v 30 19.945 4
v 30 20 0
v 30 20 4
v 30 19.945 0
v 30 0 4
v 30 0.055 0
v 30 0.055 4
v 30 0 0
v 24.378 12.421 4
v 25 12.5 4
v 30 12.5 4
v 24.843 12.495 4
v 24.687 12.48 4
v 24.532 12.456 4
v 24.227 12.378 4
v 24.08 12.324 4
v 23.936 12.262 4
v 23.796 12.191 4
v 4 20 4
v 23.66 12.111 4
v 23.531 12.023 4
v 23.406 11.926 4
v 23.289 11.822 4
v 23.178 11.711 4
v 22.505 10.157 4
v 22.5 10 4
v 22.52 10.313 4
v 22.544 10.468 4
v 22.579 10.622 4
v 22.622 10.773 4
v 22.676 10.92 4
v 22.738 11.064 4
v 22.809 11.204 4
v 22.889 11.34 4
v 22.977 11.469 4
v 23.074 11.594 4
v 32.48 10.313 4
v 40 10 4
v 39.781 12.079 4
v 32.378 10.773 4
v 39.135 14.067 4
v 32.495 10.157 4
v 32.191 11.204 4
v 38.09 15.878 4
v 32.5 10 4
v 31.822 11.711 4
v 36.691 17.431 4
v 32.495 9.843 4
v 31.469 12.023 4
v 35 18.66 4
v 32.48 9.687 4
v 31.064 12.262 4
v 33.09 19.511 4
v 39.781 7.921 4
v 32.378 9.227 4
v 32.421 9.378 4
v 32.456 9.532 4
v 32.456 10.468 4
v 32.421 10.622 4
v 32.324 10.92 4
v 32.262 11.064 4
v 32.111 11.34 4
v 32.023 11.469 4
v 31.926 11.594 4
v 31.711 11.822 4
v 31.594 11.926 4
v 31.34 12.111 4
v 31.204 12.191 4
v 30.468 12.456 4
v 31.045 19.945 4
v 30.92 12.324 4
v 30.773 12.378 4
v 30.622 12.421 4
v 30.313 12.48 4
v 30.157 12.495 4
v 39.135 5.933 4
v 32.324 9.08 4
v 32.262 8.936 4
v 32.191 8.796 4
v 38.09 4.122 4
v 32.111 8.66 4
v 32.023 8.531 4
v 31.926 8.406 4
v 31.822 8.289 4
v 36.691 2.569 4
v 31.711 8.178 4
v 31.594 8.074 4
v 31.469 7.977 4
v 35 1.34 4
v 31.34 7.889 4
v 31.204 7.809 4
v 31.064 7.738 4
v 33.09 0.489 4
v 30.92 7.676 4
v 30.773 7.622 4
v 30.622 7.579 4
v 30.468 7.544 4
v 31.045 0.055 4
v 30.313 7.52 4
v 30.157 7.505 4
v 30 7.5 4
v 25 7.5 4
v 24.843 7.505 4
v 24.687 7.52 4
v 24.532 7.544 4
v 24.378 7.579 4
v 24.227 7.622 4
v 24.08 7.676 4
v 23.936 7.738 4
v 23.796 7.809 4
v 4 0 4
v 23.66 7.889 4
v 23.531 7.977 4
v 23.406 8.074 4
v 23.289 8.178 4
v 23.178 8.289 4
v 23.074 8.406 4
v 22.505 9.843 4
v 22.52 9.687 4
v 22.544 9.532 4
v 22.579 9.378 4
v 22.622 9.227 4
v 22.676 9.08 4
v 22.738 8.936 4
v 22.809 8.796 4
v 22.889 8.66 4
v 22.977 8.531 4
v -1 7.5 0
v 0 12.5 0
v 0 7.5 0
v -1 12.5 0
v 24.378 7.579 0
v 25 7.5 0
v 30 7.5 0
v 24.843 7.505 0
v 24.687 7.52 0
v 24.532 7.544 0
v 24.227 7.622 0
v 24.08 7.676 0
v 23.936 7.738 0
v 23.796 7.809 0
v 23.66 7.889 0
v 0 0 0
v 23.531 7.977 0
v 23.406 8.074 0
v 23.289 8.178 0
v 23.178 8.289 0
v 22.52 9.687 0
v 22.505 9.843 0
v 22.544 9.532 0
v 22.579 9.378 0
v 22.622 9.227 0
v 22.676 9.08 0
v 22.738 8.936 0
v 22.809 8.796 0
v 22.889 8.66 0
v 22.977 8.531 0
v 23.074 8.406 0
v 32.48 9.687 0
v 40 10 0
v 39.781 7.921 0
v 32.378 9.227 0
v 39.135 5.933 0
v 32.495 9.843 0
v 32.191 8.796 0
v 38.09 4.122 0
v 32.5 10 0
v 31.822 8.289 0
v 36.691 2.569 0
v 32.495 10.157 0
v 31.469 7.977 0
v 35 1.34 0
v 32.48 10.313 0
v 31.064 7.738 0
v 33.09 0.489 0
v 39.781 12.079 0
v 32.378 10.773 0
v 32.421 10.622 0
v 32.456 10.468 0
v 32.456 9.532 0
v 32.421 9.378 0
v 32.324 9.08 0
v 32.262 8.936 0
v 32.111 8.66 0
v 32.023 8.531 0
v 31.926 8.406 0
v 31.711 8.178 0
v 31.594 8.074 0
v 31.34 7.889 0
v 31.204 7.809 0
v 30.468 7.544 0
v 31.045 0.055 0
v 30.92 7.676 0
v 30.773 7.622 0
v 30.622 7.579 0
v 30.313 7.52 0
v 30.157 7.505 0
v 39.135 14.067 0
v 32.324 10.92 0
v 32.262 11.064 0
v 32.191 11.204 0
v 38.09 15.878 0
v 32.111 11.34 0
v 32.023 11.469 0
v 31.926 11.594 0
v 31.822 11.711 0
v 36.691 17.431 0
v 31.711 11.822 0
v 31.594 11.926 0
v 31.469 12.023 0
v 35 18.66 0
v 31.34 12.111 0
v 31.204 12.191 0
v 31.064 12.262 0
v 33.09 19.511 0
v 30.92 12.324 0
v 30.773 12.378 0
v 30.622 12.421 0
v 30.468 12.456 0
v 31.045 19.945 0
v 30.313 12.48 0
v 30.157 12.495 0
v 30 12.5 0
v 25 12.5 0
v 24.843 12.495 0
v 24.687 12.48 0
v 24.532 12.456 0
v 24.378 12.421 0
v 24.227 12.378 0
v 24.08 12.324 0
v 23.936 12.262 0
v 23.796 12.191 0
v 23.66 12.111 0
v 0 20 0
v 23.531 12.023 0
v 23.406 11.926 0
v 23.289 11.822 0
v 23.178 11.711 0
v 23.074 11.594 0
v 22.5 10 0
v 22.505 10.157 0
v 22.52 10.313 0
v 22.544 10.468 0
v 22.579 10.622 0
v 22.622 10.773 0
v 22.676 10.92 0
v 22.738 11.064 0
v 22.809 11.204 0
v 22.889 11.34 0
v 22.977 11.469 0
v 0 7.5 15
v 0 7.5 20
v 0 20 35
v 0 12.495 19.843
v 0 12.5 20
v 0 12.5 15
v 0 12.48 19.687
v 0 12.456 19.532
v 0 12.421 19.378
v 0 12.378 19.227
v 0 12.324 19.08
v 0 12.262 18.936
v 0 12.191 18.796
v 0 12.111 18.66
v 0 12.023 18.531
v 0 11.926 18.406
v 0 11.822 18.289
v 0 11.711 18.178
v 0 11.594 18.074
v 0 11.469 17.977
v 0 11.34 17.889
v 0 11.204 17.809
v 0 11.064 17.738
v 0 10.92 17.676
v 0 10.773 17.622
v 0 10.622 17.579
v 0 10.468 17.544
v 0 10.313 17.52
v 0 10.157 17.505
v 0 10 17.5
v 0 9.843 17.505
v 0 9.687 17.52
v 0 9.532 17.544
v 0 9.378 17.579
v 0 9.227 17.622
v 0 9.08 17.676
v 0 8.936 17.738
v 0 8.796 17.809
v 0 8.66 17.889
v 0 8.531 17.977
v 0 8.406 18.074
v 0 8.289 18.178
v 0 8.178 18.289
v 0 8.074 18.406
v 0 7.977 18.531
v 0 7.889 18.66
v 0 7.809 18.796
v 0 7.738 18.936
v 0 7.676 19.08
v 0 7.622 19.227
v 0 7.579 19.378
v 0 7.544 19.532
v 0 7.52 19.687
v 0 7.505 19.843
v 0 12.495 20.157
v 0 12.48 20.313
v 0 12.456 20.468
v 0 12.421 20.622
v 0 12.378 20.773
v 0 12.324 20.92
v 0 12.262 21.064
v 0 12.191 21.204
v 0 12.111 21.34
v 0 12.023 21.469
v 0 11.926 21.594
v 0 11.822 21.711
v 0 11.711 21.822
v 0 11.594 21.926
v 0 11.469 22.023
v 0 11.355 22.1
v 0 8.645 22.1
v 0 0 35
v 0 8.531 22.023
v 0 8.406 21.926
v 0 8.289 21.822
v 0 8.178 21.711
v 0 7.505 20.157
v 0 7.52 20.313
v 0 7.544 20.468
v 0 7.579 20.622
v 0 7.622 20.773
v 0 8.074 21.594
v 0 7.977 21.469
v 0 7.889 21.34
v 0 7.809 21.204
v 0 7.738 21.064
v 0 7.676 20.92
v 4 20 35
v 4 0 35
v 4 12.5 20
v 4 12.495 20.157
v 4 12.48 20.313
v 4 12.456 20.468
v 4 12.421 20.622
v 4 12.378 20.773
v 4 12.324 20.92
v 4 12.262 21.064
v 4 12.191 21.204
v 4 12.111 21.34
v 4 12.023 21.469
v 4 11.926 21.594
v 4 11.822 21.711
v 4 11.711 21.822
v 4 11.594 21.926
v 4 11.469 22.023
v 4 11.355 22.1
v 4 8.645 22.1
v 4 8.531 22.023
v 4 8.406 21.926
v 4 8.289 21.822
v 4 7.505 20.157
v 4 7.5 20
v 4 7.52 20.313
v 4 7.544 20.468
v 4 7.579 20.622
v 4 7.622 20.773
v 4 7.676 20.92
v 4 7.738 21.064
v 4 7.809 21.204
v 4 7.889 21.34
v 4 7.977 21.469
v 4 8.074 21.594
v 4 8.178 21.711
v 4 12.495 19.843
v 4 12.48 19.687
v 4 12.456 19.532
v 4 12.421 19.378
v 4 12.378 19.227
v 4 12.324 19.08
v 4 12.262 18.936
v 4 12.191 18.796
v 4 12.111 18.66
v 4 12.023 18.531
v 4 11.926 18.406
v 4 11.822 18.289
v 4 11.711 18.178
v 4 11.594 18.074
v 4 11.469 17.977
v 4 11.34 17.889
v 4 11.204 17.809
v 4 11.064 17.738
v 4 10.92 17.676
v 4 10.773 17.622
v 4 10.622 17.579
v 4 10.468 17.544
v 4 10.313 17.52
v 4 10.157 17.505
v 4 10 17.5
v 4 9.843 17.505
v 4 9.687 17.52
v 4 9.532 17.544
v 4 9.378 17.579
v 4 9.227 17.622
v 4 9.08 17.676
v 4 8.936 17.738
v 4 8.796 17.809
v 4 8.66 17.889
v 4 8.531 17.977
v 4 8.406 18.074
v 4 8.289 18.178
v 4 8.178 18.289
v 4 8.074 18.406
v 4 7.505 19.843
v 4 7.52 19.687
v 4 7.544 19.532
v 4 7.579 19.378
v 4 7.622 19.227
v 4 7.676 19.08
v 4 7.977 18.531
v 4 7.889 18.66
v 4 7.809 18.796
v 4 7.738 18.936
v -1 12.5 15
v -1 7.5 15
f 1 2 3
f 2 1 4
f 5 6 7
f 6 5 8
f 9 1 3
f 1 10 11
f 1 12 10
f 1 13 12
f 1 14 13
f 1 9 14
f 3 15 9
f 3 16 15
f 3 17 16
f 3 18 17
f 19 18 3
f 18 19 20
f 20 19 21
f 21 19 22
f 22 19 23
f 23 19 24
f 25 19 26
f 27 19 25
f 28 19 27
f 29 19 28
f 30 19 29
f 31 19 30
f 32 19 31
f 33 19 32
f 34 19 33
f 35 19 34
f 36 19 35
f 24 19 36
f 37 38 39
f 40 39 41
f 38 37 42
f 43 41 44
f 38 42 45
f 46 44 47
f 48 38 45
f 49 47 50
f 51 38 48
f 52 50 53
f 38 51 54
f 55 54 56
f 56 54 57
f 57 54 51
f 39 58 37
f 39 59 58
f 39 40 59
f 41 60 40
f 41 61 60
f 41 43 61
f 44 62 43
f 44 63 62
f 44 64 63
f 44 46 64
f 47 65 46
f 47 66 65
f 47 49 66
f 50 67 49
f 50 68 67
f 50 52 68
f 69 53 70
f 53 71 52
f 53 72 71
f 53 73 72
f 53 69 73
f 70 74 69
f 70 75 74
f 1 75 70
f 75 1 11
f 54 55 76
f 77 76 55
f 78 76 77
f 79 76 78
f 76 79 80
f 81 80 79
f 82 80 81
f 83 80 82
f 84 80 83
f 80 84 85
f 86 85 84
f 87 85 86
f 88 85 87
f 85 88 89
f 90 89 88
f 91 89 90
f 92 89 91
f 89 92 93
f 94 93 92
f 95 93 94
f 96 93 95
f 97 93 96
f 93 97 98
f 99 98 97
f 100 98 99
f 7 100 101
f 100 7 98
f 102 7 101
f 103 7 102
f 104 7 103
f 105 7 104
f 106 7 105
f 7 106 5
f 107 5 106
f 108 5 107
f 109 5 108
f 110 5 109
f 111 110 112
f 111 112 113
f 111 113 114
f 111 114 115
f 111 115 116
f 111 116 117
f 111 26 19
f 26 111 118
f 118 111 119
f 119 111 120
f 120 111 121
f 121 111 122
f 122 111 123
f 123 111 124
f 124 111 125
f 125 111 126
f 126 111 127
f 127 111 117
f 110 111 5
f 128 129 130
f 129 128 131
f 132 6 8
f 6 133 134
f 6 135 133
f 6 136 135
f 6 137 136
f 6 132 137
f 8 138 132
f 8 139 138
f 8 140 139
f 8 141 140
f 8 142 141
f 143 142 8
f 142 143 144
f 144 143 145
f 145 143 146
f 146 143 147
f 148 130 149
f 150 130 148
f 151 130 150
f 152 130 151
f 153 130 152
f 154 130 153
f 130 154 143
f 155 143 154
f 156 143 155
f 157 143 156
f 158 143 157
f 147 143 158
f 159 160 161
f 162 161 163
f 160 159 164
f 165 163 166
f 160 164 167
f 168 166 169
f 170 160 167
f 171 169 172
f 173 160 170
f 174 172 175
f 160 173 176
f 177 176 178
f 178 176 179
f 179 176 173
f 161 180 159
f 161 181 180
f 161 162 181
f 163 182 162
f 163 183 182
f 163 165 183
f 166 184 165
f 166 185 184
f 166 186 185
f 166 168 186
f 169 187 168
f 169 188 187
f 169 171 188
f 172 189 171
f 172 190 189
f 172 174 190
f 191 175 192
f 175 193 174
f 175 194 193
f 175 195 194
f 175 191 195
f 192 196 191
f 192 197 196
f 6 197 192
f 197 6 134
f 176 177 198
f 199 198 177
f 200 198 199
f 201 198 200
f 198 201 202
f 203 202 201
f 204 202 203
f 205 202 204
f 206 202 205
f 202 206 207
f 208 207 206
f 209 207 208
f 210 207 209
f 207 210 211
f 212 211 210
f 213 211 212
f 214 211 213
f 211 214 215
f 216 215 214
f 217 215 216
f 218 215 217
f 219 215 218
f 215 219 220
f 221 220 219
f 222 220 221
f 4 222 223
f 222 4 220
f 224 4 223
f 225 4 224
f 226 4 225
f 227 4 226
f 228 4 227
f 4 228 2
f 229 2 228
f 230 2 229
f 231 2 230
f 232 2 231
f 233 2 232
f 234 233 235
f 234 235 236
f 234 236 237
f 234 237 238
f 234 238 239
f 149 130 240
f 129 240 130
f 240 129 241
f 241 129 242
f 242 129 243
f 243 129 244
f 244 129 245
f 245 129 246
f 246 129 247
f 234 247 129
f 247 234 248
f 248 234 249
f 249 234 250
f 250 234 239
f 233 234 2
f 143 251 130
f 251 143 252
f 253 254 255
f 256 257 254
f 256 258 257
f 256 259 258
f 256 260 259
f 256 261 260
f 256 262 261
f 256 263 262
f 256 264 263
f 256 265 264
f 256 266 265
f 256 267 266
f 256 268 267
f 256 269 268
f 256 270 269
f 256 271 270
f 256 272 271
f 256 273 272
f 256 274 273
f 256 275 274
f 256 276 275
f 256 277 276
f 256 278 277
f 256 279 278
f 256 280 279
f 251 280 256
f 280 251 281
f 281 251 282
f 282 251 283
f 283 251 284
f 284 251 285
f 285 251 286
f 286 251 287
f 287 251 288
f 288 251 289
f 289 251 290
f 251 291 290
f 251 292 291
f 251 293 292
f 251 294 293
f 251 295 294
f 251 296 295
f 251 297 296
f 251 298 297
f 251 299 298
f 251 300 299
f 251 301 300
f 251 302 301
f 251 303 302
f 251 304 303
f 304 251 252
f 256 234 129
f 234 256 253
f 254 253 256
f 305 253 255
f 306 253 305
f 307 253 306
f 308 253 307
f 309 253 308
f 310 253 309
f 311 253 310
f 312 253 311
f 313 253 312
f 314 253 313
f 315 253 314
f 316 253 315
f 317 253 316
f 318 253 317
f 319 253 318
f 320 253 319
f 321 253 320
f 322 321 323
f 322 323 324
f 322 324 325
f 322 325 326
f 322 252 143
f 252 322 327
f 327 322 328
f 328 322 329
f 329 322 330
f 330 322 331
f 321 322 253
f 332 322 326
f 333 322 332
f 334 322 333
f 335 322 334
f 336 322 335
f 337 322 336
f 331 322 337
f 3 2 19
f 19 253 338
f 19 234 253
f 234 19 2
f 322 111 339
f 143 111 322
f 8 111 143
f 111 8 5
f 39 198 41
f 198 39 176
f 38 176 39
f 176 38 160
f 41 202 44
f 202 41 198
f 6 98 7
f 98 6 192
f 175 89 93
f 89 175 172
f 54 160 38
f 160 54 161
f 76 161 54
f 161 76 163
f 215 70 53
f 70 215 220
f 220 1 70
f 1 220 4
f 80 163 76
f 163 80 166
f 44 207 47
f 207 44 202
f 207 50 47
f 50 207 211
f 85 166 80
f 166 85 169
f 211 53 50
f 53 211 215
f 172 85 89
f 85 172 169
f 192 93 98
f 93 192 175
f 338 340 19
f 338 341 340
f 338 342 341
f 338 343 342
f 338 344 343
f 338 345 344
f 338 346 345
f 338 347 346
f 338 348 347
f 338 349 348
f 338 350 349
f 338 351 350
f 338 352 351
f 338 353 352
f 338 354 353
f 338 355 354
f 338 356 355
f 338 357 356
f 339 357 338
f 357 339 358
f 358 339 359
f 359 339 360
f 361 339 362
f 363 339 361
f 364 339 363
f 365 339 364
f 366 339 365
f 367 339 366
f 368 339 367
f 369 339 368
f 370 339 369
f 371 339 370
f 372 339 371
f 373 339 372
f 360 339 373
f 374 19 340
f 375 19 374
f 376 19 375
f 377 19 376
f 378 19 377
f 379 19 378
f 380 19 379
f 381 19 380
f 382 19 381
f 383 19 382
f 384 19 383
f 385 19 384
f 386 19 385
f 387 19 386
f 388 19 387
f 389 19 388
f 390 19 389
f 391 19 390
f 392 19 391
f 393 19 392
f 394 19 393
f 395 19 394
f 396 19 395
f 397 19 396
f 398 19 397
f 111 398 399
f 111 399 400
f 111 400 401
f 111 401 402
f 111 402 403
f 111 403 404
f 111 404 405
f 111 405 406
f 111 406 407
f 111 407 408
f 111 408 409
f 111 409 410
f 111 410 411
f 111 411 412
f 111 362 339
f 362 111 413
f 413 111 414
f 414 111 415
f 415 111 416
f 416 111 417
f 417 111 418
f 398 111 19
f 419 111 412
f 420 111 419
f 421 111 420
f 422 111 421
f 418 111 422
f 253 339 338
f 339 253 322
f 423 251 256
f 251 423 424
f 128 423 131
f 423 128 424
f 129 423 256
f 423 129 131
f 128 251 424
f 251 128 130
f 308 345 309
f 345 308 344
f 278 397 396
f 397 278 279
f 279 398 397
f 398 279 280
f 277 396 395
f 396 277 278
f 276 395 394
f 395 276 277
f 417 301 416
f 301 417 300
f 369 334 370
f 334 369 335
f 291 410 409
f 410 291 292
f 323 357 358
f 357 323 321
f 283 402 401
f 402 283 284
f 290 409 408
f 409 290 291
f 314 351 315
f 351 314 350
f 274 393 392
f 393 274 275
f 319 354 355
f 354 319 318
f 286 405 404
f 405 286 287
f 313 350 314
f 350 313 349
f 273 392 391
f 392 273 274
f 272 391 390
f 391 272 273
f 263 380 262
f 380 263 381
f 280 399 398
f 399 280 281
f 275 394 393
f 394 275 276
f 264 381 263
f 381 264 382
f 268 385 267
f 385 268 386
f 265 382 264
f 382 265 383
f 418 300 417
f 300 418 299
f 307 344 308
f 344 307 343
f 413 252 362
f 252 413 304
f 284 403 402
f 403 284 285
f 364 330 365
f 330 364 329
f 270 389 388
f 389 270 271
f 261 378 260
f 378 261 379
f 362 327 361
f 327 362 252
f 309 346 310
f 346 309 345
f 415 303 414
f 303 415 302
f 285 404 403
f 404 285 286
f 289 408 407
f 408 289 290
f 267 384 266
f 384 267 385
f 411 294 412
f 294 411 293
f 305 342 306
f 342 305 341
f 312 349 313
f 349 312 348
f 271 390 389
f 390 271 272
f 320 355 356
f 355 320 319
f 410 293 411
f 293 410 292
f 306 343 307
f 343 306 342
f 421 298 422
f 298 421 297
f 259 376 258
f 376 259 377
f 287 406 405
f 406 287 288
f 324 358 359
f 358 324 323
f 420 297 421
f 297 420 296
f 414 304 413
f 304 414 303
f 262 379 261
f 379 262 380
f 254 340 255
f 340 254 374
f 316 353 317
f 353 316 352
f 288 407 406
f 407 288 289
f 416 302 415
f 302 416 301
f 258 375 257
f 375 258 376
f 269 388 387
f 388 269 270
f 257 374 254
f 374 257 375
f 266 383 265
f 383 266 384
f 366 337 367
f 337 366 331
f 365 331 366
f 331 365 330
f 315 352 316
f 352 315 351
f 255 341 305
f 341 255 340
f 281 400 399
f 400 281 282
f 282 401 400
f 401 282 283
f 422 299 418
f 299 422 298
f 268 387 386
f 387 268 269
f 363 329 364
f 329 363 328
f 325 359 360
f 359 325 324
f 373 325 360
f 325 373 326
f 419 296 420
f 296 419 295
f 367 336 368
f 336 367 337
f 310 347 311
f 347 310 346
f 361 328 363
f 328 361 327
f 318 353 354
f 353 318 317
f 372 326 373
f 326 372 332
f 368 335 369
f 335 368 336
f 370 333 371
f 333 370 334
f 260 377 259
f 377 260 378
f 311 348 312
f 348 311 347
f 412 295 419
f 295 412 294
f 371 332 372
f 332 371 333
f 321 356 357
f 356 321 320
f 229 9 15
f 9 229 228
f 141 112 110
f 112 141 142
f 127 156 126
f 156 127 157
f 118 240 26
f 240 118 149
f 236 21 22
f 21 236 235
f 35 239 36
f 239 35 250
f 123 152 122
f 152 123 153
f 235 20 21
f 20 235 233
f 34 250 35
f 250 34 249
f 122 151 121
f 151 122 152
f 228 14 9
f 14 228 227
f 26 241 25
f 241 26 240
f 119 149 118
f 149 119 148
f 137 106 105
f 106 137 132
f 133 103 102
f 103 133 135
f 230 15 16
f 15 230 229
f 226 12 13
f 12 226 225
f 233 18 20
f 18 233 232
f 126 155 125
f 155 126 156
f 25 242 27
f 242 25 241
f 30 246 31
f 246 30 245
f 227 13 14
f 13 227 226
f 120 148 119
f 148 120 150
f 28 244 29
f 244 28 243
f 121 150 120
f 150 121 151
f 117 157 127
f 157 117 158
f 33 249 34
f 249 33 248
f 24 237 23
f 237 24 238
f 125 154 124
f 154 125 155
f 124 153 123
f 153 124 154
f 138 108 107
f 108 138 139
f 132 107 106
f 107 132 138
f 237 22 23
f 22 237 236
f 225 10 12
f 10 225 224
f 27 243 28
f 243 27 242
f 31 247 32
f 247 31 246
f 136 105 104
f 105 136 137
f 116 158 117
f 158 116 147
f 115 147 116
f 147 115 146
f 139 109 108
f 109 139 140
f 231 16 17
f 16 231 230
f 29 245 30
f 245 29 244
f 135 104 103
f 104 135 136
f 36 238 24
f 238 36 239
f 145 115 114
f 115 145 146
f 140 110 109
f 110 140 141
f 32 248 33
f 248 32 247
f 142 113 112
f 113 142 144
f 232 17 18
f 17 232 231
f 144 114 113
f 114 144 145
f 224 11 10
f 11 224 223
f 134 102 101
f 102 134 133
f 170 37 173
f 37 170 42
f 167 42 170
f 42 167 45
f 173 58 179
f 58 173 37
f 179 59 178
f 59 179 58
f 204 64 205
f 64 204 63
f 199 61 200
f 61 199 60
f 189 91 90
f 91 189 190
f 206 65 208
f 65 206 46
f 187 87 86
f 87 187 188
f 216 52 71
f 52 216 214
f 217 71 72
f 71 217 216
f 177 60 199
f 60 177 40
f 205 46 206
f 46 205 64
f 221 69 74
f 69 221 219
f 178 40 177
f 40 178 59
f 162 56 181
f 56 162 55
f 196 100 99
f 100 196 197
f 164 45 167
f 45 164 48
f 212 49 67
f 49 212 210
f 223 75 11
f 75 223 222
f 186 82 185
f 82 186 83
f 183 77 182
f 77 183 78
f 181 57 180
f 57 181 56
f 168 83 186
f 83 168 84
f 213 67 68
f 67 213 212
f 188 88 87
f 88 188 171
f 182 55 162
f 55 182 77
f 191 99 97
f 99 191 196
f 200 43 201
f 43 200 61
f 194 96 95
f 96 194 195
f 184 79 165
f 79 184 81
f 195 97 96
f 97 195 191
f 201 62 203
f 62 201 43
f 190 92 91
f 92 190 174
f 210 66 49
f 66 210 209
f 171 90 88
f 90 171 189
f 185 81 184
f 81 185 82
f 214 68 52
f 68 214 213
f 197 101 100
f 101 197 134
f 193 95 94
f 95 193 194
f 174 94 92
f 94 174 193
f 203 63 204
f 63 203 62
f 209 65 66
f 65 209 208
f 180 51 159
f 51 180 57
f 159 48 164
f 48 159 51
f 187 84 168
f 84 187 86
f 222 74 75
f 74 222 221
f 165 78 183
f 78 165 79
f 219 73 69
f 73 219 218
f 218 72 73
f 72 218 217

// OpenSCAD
// file: functions.scad
/**********************************
	File: functions.scad
	Revision: 0.1 (10/7/2012)
	OpenSCAD version by:
	Michael Williams (gannon)
	mswillia@mtu.edu
**********************************/
include <config.scad>

//Drill a hole the given depth at the given location
module drill(x,y,radius,depth) {
	translate([x,y,-overdrill])
		cylinder(r=radius,h=depth,$fn=100);
}

module roundedcorner(radius,thickness,angle) {
	rotate([0,0,angle])
		translate([-radius+overdrill,-radius+overdrill,-overdrill])
			difference() {
				translate([-overdrill,-overdrill,0])
					cube([radius+overdrill,radius+overdrill,thickness+overdrill*2]);
				cylinder(r=radius,h=thickness+overdrill*2, $fn=100);
			}
}

//Usage: points is an array consisting of elements
//[x,y,r] for each point of the polygon
//Please note that x and y will be the centers
//of the rounded edges! Outside wall will be
//r away at some angle.
//Ideally I will make a function that will find
//the place to put the circle of a given radius
//based off of the points in the polygon.
module multiradiusroundedpoly(points,height) {
	linear_extrude(height=height)
		hull()
			for (p = points) {
				translate([p[0],p[1],0])
					circle(r=p[2],$fn=100);
			}
}
// file: config.scad
/**********************************
	File: config.scad
	Revision: 0.2 (1/5/2013)
	OpenSCAD version by:
	Michael Williams (gannon)
	mswillia@mtu.edu
**********************************/

/**********************************
		CONFIGURATION
**********************************/
//This is for the depth of holes so OpenSCAD renders correctly.
overdrill=0.1;

//LM10UU
linear_bearing_length=29;
linear_bearing_ID=10;
linear_bearing_OD=19.4;//19

//HFSB5-2020 extrusions
extrusion_height=20;
extrusion_width=20;
extrusion_wall=3.2;
extrusion_opening=5.4;

//Large rods
smooth_rod_diameter=10;
threaded_rod_diameter=8;

//608zz
skate_bearings_length=7;
skate_bearings_ID=8;
skate_bearings_OD=22;

//Belt configuration
belt_width=8;
belt_depth=1;

/*
3/8"-12 acme rod
m8 threaded rod
*/

spring_OD=6;

screw_a_diameter=3;
screw_b_diameter=4;
screw_c_diameter=5;
screw_d_diameter=8;

/**********************************
		END CONFIGURATION
**********************************/
// main file
/**********************************
	File: Y_FrameConnector.scad
	Revision: 0.2 (10/7/2012)
	OpenSCAD version by:
	Michael Williams (gannon)
	mswillia@mtu.edu
**********************************/
include <config.scad>
use <functions.scad>
/**********************************
		CONFIGURATION
**********************************/
//Base size
base=[30,20,4];
tab=[base[2],base[1],base[0]+base[2]+1];

/**********************************
		END CONFIGURATION
**********************************/

difference() {
	union() {
		cube(base);
		translate([base[0],base[1]/2,0])
			cylinder(r=base[1]/2,h=base[2]);
		cube(tab);
		translate([-1,(base[1]-5)/2,0])
			cube([1,5,15]);
	}
	translate([-overdrill,base[1]/2,20])
		rotate([0,90,0]) {
			intersection() {
				cylinder(r=screw_c_diameter/2,h=tab[0]+overdrill*2,$fn=100);
				translate([-screw_c_diameter/2+0.4,-screw_c_diameter/2,0]) cube([screw_c_diameter-0.4,screw_c_diameter,tab[0]+overdrill*2]);
			}
		}
	translate([base[0]-screw_c_diameter,base[1]/2,-overdrill]) {
		cylinder(r=screw_c_diameter/2,h=base[2]+overdrill*2,$fn=100);
		translate([0,-screw_c_diameter/2,0]) cube([5,screw_c_diameter,base[2]+overdrill*2]);
		translate([5,0,0]) cylinder(r=screw_c_diameter/2,h=base[2]+overdrill*2,$fn=100);
	}
}
